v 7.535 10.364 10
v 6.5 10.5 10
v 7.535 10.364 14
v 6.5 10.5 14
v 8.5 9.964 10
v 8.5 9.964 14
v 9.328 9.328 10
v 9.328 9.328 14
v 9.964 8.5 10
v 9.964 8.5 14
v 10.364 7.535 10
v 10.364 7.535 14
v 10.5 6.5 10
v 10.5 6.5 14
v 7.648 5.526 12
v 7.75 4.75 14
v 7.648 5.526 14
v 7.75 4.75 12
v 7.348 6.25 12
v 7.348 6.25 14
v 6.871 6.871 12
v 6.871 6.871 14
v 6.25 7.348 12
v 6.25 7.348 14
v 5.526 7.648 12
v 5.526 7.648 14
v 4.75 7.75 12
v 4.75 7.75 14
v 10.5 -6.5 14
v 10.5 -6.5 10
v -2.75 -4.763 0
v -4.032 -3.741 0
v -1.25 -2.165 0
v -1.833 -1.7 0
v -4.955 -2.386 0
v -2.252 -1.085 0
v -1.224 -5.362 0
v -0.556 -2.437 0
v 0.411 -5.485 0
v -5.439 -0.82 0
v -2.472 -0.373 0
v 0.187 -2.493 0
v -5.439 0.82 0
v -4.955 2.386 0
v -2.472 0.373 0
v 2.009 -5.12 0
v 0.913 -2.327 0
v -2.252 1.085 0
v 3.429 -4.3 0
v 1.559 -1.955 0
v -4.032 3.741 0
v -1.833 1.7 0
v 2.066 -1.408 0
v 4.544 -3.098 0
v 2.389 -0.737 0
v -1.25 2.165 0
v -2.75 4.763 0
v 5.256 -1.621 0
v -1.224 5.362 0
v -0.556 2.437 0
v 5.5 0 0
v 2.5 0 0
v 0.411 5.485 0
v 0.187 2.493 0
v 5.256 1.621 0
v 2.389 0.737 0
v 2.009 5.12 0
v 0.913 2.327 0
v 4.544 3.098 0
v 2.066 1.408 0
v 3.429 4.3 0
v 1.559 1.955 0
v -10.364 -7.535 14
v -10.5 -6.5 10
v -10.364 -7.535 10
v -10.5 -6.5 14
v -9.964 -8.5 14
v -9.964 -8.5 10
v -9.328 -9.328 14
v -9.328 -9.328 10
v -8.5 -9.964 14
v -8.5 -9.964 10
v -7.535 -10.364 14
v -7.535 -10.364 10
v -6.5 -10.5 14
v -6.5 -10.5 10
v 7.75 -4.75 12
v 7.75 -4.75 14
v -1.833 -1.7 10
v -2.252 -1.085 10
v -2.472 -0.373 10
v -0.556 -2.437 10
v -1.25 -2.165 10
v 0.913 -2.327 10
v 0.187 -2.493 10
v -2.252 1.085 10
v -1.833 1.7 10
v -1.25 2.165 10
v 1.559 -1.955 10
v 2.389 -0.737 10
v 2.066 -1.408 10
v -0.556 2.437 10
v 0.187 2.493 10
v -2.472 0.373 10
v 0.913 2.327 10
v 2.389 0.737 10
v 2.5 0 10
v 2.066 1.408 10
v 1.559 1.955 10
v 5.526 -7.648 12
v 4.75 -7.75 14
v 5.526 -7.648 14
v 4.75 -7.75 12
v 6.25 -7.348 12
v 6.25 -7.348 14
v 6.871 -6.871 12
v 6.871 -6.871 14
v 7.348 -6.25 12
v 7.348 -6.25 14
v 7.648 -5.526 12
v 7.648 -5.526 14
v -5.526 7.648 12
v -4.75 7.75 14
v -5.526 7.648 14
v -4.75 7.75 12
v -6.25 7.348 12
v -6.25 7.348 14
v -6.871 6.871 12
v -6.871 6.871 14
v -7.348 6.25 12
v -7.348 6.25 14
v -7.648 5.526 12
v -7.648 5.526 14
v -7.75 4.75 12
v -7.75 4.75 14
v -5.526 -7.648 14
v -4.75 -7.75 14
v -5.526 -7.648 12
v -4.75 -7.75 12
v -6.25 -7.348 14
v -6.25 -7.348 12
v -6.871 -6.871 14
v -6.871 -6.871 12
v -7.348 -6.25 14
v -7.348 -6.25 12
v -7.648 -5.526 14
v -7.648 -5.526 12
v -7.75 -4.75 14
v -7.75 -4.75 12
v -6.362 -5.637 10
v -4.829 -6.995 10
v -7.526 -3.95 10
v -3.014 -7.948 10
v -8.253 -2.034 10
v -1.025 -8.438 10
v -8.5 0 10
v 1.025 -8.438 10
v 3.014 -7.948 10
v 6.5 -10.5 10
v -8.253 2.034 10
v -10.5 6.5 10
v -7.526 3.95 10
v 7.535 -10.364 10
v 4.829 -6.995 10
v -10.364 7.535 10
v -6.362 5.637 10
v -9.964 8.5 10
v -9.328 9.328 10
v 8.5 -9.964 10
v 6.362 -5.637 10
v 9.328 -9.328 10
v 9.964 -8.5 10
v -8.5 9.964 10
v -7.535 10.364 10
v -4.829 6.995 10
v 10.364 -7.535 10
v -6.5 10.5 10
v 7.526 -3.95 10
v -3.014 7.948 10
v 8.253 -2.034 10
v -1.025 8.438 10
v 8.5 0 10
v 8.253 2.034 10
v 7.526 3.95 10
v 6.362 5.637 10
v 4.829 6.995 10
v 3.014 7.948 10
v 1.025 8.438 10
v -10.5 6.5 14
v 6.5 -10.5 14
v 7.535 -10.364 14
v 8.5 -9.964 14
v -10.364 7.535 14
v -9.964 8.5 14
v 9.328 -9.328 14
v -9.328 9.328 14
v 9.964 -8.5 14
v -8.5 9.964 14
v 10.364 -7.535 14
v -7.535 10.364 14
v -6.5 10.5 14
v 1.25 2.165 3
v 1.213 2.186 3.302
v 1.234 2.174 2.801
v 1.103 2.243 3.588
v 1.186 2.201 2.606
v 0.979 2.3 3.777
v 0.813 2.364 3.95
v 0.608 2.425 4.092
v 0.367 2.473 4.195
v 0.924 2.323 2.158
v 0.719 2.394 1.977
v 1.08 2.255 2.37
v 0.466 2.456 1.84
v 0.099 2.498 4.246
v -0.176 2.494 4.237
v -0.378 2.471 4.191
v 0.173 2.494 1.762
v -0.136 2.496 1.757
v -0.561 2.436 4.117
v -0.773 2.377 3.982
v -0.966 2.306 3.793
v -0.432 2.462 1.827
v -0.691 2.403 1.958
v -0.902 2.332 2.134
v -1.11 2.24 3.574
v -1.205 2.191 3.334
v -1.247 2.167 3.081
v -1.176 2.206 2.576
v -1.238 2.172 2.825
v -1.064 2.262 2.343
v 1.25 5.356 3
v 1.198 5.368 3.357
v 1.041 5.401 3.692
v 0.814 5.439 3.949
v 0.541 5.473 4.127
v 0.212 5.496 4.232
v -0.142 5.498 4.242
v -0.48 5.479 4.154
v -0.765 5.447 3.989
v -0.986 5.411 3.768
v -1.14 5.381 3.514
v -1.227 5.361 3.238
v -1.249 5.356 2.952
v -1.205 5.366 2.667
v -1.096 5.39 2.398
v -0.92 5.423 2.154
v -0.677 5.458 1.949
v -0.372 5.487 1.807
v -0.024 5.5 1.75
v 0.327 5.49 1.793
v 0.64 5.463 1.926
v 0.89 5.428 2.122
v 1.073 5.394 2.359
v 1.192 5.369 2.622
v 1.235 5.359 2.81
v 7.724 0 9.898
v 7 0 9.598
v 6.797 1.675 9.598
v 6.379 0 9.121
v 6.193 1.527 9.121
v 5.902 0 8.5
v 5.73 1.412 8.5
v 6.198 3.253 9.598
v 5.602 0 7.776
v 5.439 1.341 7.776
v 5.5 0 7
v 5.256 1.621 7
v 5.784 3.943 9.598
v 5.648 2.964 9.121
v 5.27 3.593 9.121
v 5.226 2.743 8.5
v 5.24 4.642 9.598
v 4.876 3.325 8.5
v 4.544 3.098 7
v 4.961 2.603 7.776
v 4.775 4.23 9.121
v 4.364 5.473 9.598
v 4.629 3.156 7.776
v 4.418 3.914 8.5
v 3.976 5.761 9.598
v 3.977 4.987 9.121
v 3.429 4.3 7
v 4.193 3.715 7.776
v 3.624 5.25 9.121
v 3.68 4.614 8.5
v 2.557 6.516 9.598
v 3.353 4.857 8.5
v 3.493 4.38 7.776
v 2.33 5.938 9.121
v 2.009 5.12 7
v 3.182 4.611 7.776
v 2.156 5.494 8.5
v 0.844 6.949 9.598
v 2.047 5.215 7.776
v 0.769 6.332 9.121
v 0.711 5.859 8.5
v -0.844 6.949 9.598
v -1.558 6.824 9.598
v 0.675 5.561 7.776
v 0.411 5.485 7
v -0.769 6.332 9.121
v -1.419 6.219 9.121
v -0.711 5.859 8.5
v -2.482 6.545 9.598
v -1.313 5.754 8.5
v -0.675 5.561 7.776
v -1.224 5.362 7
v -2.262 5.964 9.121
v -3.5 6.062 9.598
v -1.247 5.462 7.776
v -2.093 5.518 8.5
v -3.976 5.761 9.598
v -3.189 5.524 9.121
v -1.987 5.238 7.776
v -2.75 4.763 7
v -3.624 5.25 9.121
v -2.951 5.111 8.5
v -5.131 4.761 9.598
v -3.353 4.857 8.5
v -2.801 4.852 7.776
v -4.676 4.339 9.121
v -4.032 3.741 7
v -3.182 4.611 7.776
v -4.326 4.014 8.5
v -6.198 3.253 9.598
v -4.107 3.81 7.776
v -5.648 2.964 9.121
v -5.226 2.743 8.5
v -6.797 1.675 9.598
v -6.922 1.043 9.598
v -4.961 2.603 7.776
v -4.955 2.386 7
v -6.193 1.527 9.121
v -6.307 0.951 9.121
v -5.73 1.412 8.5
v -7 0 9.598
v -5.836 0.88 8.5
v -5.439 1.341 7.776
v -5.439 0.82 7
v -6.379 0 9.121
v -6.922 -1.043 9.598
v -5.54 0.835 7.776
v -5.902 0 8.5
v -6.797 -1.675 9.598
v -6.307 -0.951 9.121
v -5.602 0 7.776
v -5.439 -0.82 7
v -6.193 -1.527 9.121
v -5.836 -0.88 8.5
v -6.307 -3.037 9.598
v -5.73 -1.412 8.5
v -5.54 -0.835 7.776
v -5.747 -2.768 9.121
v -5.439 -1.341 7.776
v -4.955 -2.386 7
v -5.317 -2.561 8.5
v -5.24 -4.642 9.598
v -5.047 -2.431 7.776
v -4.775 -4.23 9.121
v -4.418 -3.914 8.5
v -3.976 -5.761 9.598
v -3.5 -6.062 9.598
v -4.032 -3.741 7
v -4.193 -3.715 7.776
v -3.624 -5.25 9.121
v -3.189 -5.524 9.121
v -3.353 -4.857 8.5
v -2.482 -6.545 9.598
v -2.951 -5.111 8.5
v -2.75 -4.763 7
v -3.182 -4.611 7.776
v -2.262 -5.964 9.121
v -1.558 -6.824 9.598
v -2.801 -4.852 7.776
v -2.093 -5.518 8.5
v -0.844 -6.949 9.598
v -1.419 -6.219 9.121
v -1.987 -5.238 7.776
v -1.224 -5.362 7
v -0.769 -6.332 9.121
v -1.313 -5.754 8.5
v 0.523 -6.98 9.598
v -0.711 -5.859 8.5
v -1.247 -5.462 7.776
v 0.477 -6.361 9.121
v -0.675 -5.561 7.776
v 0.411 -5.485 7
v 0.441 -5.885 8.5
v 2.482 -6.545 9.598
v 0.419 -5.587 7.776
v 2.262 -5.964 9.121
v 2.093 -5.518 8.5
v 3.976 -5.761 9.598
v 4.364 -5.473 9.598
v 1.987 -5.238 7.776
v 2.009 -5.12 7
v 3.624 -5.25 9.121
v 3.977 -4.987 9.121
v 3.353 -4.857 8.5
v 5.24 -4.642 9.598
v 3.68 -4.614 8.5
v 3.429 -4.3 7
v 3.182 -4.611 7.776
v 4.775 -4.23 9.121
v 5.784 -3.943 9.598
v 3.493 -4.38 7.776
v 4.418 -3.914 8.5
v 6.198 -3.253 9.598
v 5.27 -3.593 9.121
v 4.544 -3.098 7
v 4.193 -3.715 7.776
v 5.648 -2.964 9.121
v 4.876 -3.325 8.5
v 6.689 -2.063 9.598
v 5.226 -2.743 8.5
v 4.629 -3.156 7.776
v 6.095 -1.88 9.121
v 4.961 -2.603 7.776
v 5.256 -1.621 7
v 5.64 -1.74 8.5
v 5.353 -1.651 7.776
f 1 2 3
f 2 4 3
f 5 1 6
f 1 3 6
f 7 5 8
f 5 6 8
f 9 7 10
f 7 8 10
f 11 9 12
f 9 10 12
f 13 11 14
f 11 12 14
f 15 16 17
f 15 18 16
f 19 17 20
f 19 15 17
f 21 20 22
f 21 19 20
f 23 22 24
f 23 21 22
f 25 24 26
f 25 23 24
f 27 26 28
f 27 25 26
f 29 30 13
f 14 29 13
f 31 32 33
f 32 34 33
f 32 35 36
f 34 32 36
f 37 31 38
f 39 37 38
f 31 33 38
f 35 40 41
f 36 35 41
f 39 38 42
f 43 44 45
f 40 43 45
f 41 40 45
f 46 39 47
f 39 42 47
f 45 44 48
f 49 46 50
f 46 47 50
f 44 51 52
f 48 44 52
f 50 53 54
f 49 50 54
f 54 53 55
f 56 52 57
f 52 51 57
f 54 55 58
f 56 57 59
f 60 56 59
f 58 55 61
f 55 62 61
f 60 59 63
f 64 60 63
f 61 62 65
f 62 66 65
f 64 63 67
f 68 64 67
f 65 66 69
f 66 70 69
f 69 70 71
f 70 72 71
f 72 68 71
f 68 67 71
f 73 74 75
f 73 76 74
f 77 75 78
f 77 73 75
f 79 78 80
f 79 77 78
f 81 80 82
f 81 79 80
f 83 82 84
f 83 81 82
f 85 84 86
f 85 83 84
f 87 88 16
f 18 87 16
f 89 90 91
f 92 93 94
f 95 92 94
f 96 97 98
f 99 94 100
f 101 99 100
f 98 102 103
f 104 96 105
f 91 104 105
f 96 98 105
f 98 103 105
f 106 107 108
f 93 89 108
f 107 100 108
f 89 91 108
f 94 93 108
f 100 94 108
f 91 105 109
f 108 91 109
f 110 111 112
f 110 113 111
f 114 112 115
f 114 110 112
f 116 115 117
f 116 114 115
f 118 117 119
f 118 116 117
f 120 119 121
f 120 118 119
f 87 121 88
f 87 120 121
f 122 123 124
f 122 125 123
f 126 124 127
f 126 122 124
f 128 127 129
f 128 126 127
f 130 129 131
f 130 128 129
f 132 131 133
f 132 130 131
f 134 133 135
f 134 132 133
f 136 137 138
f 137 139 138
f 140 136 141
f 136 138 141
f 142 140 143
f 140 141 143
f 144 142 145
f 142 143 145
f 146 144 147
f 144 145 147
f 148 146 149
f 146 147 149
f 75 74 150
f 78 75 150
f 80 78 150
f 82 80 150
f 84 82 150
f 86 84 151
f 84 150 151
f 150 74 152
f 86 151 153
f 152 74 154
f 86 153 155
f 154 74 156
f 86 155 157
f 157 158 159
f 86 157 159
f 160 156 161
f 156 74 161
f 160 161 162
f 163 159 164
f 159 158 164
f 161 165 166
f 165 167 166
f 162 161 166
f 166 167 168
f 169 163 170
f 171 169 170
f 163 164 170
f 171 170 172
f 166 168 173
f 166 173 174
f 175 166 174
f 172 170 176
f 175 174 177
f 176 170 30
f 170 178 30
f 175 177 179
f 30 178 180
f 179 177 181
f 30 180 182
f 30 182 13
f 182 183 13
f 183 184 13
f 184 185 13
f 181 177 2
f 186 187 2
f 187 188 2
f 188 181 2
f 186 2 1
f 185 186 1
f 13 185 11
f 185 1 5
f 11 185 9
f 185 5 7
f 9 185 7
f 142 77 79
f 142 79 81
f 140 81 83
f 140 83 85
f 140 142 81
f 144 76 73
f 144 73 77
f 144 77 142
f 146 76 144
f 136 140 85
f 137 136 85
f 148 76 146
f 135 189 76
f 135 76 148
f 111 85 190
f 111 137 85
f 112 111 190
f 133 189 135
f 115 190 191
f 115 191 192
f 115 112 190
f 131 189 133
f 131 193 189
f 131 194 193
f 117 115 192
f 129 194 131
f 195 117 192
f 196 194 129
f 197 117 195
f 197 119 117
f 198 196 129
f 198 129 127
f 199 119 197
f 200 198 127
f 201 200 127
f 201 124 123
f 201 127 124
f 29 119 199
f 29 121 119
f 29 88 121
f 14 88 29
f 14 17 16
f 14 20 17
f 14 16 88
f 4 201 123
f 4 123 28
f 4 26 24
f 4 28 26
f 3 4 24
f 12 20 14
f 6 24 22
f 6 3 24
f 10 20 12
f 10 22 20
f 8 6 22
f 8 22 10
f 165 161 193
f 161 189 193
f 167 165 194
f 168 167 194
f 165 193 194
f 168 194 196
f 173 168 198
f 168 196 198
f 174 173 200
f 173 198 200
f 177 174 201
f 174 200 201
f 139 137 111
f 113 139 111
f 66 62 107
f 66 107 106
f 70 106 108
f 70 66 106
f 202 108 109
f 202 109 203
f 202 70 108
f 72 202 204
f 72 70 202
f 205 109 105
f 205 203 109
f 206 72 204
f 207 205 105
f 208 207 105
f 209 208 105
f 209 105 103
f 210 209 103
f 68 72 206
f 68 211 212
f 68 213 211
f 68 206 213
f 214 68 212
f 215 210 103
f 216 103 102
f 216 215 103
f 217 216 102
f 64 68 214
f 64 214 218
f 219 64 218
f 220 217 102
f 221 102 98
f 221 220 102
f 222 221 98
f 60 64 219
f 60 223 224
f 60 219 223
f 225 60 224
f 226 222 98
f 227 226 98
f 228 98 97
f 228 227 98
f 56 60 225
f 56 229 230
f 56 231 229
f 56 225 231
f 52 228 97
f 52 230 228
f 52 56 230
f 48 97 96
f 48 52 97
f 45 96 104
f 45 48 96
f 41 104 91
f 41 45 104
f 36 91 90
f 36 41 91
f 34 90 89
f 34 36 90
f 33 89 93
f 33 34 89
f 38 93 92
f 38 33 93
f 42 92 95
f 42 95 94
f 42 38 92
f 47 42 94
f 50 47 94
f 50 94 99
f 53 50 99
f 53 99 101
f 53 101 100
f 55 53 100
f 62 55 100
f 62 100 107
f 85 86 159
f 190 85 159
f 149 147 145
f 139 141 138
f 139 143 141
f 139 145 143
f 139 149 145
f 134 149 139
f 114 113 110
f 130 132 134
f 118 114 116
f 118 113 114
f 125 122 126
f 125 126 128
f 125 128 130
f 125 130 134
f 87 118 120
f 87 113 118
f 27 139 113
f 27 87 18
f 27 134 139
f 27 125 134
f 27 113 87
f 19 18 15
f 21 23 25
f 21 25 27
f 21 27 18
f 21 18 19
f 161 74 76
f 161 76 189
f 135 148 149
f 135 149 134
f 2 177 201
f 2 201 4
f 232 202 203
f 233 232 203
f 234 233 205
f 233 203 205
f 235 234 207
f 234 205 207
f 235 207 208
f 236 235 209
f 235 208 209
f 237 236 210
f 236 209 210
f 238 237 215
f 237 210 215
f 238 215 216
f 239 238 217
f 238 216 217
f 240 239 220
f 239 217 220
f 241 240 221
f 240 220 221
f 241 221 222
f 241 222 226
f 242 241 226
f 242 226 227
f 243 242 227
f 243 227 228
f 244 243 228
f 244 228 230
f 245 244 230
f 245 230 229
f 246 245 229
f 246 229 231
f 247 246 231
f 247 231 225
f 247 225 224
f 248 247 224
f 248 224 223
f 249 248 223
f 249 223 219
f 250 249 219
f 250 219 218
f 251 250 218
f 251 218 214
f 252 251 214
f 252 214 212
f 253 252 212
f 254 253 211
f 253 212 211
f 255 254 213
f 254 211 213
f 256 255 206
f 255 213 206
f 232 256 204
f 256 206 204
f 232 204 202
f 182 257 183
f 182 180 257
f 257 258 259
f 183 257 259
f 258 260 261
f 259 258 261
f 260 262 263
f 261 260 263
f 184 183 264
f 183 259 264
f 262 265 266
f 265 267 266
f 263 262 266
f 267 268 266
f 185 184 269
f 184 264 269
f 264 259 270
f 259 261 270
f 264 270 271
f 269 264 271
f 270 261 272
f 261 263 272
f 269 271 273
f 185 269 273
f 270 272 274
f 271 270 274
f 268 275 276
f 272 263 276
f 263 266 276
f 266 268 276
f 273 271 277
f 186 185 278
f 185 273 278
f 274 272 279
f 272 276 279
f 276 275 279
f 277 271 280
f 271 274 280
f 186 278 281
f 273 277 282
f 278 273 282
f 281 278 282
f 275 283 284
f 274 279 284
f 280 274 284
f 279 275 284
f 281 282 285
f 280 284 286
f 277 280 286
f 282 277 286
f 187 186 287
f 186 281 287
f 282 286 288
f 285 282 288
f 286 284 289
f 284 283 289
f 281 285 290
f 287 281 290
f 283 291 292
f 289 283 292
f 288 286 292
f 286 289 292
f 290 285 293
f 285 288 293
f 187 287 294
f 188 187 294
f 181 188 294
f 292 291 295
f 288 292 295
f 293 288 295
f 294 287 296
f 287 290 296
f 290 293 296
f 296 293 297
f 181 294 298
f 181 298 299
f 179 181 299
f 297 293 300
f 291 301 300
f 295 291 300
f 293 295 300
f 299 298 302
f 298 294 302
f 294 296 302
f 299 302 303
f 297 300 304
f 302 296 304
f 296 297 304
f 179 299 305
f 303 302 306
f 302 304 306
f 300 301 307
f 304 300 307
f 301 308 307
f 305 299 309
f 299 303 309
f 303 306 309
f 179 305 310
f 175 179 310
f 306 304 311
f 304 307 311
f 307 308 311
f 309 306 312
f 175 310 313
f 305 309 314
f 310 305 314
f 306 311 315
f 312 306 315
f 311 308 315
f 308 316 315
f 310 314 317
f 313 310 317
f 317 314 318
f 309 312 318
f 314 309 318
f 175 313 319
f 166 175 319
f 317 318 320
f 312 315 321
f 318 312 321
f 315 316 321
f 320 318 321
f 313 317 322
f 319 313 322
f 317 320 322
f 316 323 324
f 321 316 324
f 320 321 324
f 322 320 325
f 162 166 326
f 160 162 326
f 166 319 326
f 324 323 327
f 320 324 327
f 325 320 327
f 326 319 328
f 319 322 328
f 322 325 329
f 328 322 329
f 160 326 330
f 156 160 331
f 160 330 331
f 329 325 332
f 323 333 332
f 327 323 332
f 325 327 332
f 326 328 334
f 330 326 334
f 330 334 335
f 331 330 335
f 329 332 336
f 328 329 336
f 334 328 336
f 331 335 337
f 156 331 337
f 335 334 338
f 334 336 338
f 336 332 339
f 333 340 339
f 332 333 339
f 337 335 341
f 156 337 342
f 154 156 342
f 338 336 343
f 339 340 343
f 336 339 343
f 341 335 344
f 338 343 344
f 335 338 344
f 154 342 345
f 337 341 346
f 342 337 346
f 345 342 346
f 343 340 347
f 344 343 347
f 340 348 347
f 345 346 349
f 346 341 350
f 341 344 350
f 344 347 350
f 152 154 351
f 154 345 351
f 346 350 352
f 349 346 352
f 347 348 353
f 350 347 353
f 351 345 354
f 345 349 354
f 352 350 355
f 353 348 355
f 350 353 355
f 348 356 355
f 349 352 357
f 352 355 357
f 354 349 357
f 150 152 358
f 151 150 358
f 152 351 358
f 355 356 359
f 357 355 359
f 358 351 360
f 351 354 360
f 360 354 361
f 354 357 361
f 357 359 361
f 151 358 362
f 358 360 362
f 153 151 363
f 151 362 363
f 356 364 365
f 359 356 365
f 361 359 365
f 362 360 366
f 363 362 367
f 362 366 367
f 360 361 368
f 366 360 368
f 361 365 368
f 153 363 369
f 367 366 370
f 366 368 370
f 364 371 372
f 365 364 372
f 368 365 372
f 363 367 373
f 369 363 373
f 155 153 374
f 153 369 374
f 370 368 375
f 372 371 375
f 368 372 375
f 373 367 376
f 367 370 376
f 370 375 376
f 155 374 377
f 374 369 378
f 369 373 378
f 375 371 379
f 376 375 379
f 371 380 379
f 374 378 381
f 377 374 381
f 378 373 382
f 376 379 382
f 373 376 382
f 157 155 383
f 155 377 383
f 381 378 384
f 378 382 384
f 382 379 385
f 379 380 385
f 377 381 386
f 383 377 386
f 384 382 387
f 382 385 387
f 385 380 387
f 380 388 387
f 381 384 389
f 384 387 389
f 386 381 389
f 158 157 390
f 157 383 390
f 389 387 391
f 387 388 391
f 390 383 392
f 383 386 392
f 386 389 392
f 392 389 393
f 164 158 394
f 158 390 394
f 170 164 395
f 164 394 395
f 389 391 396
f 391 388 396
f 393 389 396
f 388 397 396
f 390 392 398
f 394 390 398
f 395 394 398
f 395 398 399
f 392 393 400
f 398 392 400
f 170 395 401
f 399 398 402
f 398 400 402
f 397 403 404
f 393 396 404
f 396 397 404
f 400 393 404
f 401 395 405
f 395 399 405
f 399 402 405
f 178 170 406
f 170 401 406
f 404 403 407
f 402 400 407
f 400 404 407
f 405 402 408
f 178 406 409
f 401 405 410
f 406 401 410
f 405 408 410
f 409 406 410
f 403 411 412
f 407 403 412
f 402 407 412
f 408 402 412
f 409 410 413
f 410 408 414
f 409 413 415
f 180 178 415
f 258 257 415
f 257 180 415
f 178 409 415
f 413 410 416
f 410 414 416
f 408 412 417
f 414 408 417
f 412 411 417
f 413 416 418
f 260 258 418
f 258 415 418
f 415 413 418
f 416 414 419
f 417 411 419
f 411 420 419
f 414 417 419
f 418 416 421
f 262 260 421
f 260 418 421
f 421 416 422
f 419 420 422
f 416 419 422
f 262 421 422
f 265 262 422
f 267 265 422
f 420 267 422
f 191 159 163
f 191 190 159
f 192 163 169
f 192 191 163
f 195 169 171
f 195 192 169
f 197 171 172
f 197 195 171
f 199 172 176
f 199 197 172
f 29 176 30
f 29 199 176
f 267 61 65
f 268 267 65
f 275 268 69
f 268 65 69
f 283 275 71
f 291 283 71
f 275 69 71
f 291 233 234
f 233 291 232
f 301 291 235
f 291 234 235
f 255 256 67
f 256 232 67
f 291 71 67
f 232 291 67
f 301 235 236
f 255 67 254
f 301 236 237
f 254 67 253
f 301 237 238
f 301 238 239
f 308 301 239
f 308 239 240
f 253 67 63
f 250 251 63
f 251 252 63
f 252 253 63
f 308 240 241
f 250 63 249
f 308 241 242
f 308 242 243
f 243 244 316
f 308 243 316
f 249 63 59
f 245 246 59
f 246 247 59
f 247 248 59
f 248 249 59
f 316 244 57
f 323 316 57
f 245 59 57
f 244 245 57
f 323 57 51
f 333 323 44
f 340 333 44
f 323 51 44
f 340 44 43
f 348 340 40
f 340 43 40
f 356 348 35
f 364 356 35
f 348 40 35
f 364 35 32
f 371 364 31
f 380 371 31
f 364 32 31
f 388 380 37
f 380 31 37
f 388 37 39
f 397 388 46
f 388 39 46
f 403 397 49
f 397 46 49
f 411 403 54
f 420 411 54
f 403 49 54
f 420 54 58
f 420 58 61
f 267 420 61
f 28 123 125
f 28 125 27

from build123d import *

# Parameters (mm, degrees)
F0_R     = 5.5
F0_R_2   = 2.5
F1_DEPTH = 10
F2_W     = 21
F2_H     = 21
F3_DEPTH = 4
F4_W     = 15.5
F4_H     = 15.5
F5_DEPTH = 2
F6_R     = 4
F7_R     = 1.25
F8_DEPTH = 10
F9_R     = 3


with BuildPart() as f1:
    # F0 (on Top) → F1 (new body)
    with BuildSketch(Plane.XY):
        Circle(F0_R)
        Circle(F0_R_2, mode=Mode.SUBTRACT)
    extrude(amount=F1_DEPTH)

    # F2 (on face) → F3 (join)
    with BuildSketch(Plane.XY.offset(10)):
        Rectangle(F2_W, F2_H)
    extrude(amount=F3_DEPTH)

    # F4 (on face) → F5 (cut)
    with BuildSketch(Plane.XY.offset(14)):
        Rectangle(F4_W, F4_H)
    extrude(amount=-F5_DEPTH, mode=Mode.SUBTRACT)

    # F6
    f6_edges = [f1.edges().sort_by_distance(p)[0] for p in [
        (10.5, 10.5, 12),
        (10.5, -10.5, 12),
        (-10.5, -10.5, 12),
        (-10.5, 10.5, 12),
    ]]
    fillet(f6_edges, radius=F6_R)

    # F7 (on Front) → F8 (cut)
    with BuildSketch(Plane.XZ):
        with Locations((0, 3)):
            Circle(F7_R)
    extrude(amount=-F8_DEPTH, mode=Mode.SUBTRACT)

    # F9
    f9_edges = [f1.edges().sort_by_distance(p)[0] for p in [
        (-7.75, 7.75, 13),
        (7.75, 7.75, 13),
        (-7.75, -7.75, 13),
        (7.75, -7.75, 13),
        (-5.5, 0, 10),
    ]]
    fillet(f9_edges, radius=F9_R)


solid = f1.part
